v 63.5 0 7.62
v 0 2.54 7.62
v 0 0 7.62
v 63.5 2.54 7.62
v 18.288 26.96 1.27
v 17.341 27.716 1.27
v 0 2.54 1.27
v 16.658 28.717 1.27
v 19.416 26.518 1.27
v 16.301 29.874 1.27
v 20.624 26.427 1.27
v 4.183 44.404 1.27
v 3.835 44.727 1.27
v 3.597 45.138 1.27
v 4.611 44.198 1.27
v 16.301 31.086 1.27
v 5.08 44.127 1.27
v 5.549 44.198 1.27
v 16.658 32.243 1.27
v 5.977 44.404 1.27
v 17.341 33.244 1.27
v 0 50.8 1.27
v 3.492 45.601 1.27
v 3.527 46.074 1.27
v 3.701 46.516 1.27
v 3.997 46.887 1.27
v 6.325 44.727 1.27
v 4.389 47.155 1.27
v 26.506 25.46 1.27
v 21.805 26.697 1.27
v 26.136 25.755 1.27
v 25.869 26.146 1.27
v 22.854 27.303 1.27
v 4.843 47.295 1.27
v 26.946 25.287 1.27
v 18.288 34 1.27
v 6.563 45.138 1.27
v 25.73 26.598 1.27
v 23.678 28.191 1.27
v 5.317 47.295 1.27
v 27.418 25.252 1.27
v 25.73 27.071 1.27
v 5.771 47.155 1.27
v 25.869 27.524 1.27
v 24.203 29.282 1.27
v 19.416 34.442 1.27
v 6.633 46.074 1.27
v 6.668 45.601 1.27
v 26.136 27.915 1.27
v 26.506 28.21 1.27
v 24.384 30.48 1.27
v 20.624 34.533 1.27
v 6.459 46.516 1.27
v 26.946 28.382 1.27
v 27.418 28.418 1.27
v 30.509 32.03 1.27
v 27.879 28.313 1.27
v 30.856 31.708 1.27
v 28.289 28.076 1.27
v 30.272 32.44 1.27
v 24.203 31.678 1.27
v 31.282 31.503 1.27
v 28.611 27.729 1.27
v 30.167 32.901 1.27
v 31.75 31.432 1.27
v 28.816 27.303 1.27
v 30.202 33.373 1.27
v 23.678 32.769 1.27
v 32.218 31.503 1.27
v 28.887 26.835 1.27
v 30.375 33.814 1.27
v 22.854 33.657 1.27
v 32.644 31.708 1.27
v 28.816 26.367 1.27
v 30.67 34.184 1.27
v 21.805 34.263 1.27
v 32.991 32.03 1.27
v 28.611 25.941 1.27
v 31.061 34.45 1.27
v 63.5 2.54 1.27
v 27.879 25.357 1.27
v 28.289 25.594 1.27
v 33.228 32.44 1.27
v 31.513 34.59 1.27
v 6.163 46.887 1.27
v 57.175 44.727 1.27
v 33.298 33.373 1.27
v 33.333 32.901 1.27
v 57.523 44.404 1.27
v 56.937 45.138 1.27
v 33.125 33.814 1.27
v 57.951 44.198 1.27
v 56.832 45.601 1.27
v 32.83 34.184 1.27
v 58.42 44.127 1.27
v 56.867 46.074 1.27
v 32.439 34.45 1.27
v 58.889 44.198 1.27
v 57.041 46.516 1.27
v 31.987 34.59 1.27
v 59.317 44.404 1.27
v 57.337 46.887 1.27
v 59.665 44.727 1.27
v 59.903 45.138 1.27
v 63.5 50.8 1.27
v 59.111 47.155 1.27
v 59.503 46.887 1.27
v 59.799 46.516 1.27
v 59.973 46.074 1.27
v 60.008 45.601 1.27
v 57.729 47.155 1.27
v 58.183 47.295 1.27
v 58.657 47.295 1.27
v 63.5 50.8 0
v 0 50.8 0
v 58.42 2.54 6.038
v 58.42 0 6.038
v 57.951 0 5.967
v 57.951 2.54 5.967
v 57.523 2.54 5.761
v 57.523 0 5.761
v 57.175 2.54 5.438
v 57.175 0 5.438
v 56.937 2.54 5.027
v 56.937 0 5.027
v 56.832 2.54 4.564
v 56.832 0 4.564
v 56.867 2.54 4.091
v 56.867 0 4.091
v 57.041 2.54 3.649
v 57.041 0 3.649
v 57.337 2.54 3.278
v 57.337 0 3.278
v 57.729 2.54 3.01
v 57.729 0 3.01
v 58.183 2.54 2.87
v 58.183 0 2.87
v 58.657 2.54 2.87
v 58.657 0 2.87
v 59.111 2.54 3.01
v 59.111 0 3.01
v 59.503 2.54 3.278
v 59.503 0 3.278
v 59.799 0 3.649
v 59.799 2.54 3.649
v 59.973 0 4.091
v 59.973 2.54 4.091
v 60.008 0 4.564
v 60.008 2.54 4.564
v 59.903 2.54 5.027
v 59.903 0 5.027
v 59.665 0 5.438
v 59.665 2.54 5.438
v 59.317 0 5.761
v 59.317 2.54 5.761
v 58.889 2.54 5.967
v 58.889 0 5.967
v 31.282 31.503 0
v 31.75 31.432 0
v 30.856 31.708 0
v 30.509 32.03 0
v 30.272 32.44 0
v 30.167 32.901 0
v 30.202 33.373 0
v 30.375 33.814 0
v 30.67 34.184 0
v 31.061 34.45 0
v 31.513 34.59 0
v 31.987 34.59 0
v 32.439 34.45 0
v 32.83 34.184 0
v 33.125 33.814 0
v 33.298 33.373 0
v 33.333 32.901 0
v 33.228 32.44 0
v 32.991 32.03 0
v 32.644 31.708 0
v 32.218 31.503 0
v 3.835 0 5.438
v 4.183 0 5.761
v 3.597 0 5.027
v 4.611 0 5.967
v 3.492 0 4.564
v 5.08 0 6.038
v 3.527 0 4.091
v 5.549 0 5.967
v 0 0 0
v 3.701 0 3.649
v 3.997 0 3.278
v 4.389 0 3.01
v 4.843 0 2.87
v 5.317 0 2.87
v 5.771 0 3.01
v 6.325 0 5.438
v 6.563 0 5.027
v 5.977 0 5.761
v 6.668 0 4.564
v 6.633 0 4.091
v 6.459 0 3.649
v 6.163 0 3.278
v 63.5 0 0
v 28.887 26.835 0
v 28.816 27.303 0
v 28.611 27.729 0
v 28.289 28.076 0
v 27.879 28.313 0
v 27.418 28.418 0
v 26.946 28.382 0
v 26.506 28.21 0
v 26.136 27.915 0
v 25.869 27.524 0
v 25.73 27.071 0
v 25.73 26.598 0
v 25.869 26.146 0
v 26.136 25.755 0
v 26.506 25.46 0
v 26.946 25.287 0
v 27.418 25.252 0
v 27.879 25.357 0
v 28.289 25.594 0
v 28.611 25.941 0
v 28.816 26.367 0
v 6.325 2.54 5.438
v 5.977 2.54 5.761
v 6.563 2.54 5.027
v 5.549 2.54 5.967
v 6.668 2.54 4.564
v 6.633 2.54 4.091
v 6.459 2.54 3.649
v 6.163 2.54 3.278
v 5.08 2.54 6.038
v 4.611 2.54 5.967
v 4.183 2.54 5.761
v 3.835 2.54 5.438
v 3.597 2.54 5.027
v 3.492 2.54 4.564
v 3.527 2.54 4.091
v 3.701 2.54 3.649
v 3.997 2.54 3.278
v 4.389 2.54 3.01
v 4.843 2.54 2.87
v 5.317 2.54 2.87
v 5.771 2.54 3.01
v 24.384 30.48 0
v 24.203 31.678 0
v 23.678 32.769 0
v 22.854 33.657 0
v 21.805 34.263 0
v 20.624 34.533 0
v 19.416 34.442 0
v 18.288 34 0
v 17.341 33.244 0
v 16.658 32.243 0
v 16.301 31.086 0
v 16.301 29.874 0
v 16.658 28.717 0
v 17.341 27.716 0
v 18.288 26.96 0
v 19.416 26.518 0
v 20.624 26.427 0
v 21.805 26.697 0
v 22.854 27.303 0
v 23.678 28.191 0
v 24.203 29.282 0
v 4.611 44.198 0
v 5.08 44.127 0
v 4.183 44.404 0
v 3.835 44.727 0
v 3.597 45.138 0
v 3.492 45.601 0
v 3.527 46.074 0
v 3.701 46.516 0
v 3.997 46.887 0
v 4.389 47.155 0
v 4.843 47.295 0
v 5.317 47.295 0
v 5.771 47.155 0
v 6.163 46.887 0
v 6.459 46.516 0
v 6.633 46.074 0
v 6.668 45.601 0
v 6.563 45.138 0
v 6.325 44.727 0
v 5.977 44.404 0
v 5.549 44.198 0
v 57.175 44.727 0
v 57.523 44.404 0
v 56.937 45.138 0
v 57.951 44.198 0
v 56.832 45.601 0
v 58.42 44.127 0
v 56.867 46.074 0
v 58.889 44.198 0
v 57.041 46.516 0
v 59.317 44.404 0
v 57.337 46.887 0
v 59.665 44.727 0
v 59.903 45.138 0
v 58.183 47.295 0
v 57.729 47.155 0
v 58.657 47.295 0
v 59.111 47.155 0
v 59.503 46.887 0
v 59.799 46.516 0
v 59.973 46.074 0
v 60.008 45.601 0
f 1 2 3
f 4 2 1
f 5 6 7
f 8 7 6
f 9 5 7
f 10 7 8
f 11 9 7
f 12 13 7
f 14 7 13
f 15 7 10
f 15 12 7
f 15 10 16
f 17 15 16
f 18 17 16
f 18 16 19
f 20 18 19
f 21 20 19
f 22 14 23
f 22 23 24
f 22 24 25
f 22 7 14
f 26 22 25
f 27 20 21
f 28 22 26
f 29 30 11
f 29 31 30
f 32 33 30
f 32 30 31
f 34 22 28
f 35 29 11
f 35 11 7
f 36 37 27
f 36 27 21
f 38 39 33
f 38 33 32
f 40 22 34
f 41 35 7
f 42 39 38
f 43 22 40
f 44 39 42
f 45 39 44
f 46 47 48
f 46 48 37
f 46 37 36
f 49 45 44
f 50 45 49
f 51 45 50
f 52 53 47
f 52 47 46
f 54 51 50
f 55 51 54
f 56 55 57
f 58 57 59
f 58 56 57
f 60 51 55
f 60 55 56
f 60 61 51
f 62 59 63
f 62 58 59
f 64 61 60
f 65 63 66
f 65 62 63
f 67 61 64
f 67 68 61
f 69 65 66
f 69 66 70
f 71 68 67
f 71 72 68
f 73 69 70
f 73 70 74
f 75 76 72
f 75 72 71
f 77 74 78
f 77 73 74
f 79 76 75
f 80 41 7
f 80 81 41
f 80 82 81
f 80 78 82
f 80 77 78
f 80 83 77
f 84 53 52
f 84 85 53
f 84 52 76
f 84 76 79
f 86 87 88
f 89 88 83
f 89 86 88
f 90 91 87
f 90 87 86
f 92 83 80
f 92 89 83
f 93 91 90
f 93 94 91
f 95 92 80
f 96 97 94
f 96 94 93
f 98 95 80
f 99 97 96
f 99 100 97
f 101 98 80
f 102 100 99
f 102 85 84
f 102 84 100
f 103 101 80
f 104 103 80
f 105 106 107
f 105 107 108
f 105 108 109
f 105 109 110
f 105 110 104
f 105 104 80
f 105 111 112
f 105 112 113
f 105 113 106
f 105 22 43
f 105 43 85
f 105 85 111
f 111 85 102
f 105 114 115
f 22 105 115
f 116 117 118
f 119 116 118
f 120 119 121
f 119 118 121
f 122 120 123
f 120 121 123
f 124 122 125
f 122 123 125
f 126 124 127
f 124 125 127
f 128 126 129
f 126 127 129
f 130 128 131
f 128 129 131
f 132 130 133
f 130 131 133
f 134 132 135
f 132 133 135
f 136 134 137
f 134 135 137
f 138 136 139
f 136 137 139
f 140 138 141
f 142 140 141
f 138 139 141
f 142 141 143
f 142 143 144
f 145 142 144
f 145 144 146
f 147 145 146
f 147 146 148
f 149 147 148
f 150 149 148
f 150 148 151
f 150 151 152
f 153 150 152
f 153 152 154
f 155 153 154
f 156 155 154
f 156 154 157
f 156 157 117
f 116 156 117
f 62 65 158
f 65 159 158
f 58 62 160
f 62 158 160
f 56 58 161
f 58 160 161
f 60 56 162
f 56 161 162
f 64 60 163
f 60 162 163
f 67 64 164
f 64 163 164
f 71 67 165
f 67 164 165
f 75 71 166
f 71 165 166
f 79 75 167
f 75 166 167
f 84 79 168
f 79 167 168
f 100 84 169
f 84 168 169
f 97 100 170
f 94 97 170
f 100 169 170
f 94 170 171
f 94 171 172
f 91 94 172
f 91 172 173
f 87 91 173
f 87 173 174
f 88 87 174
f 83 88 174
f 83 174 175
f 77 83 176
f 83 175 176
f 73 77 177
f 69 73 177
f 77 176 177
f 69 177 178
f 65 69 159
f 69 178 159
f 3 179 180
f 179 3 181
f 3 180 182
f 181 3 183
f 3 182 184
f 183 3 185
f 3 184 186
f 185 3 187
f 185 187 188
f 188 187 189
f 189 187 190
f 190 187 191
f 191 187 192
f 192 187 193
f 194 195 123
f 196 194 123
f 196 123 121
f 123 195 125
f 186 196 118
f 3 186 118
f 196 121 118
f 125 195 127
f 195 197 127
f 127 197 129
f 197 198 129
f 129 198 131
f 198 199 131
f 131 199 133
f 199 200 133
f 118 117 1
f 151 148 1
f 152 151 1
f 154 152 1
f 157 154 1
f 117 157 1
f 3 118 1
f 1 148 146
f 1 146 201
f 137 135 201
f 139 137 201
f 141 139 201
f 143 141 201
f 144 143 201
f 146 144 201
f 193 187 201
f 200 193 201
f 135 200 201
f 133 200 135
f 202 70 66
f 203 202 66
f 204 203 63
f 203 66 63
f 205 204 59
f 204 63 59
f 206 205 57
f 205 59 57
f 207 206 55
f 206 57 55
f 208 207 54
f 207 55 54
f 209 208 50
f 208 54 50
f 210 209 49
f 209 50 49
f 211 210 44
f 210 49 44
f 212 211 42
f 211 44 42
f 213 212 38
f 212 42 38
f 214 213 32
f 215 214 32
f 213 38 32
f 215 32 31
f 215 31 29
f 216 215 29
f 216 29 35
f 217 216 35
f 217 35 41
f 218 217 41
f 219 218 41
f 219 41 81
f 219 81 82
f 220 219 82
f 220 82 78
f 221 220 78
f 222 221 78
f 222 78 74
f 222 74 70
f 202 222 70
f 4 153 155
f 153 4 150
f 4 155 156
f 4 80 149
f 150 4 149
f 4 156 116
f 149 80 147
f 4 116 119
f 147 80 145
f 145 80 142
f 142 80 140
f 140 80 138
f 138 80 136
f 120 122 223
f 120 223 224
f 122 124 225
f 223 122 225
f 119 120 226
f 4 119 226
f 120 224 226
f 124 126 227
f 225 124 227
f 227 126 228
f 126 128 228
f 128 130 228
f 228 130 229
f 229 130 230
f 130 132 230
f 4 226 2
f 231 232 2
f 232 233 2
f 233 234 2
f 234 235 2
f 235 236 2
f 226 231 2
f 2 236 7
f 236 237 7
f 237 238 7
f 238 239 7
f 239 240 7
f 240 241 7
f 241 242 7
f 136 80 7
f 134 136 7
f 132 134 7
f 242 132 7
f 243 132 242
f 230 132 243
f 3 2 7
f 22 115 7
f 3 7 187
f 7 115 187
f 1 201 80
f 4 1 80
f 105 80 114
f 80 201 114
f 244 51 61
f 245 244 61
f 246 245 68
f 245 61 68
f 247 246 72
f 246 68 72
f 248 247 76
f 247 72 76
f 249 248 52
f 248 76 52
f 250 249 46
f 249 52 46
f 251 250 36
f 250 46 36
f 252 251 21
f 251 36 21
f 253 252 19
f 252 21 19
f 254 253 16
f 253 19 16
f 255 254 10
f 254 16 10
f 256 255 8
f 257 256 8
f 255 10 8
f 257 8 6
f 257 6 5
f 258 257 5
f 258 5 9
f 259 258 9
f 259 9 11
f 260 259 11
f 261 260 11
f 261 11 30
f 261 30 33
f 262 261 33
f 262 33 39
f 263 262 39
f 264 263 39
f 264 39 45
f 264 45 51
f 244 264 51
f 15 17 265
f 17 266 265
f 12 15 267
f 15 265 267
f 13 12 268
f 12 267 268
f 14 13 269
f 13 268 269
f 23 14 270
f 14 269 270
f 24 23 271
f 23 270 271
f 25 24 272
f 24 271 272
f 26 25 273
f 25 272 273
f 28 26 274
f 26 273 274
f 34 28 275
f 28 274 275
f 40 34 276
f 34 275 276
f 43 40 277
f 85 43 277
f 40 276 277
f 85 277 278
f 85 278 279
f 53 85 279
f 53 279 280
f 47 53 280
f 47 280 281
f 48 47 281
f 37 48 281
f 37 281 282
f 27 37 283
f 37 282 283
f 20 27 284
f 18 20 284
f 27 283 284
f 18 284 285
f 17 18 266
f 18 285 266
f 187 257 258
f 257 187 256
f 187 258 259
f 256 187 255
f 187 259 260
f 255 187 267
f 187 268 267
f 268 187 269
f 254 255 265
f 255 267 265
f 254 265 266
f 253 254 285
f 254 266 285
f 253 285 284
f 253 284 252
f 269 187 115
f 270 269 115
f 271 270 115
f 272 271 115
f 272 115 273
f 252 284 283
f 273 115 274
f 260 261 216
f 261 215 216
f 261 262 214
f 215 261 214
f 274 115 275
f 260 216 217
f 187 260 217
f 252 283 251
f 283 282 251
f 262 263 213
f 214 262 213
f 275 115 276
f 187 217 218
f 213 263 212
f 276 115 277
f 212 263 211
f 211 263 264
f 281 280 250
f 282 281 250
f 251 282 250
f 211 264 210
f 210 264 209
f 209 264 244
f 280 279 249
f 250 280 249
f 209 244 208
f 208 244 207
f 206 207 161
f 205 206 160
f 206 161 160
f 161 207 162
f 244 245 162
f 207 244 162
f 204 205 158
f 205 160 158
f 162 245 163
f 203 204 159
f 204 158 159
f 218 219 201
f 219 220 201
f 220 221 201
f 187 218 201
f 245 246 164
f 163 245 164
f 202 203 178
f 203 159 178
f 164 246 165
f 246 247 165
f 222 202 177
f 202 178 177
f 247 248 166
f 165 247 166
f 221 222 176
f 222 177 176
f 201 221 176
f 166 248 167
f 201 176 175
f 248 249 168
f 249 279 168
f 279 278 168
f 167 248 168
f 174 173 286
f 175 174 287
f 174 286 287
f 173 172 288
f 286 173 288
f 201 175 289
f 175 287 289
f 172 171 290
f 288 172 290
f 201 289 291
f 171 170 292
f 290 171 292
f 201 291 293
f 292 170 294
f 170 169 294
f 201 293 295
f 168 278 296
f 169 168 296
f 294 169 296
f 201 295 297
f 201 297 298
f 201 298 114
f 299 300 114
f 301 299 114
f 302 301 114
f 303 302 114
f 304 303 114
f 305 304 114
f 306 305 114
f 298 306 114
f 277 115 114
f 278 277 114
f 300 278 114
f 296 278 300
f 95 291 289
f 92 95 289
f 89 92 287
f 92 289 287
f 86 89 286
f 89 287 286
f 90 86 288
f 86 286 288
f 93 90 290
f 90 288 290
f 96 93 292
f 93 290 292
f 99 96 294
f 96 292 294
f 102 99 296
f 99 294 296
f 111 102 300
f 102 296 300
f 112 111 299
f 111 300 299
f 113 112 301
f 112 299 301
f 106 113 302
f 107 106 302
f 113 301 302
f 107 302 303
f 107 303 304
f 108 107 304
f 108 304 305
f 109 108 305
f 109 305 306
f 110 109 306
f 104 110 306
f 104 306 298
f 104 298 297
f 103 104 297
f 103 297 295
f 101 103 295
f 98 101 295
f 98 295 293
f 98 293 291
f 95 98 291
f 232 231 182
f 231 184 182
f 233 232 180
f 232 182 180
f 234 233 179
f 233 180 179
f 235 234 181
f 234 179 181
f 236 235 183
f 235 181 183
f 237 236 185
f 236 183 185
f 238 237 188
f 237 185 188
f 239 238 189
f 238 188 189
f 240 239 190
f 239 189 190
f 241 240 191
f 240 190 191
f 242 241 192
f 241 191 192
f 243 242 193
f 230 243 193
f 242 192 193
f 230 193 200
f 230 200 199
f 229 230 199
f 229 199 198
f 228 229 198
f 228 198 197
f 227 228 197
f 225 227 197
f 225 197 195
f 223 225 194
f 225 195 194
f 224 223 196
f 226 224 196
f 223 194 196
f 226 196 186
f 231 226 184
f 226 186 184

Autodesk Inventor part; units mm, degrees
ref_plane "YZ Plane" through (0, 0, 0) normal (1, 0, 0) x (0, 1, 0)
ref_plane "XZ Plane" through (0, 0, 0) normal (0, 1, 0) x (-1, 0, 0)
ref_plane "XY Plane" through (0, 0, 0) normal (0, 0, 1) x (1, 0, 0)
sketch "Sketch1" plane through (0, 0, 0) normal (0, 0, 1) x (1, 0, 0)
  line L0 (0, 0) -> (63.5, 0)
  line L1 (63.5, 0) -> (63.5, 50.8)
  line L2 (63.5, 50.8) -> (0, 50.8)
  line L3 (0, 50.8) -> (0, 0)
  dimension "d0" = 50.8
  dimension "d1" = 63.5
extrude "Extrusion1" add sketch "Sketch1" along normal blind 1.27
sketch "Sketch2" plane through (0, 0, 1.27) normal (0, 0, 1) x (1, 0, 0)
  line L0 (63.5, 0) -> (63.5, 50.8) projected
  line L1 (0, 0) -> (63.5, 0)
  line L2 (63.5, 0) -> (63.5, 2.54)
  line L3 (63.5, 2.54) -> (0, 2.54)
  line L4 (0, 2.54) -> (0, 0)
  dimension "d4" = 2.54
extrude "Extrusion2" add sketch "Sketch2" along normal blind 6.35
sketch "Sketch3" plane through (0, 0, 1.27) normal (0, 0, 1) x (1, 0, 0)
  line L0 (63.5, 50.8) -> (0, 50.8) projected
  line L1 (63.5, 2.54) -> (63.5, 50.8) projected
  point P0 (0, 0)
  point P1 (31.75, 33.02)
  dimension "d7" = 17.78
  dimension "d8" = 31.75
hole "Hole1" at (31.75, 33.02, 1.27) direction (0, 0, -1) diameter 3.175 depth 25.4 tip angle 118
sketch "Sketch4" plane through (0, 0, 1.27) normal (0, 0, 1) x (1, 0, 0)
  line L0 (0, 50.8) -> (0, 2.54) projected
  line L1 (63.5, 2.54) -> (63.5, 50.8) projected
  line L2 (63.5, 50.8) -> (0, 50.8) projected
  point P0 (0, 0)
  point P1 (5.08, 45.72)
  point P2 (58.42, 45.72)
  dimension "d16" = 5.08
  dimension "d17" = 5.08
  dimension "d18" = 5.08
  dimension "d19" = 5.08
hole "Hole2" at (5.08, 45.72, 1.27) at (58.42, 45.72, 1.27) direction (0, 0, -1) diameter 3.1852 depth 25.4 tip angle 118
sketch "Sketch5" plane through (0, 2.54, 1.27) normal (0, 1, 0) x (1, 0, 0)
  line L0 (63.5, -6.35) -> (0, -6.35) projected
  line L1 (0, 0) -> (0, -6.35) projected
  line L2 (63.5, 0) -> (63.5, -6.35) projected
  point P0 (0, 1.27)
  point P1 (5.08, -3.175)
  point P2 (58.42, -3.175)
  dimension "d27" = 3.175
  dimension "d28" = 5.08
  dimension "d29" = 3.175
  dimension "d30" = 5.08
hole "Hole3" at (5.08, 2.54, 4.445) at (58.42, 2.54, 4.445) direction (0, -1, 0) diameter 3.1852 depth 25.4 tip angle 118
sketch "Sketch6" plane through (0, 0, 1.27) normal (0, 0, 1) x (1, 0, 0)
  circle A0 centre (31.75, 33.02) radius 1.5875 construction
  circle A1 centre (31.75, 33.02) radius 3.81 construction
  circle A2 centre (27.2994, 26.8348) radius 3.81 construction
  line L0 (0, 0) -> (63.5, 0) projected
  circle A3 centre (20.32, 30.48) radius 4.064
  circle A4 centre (27.2994, 26.8348) radius 1.5875
  circle A5 centre (5.08, 45.72) radius 1.5926 projected
  line L1 (0, 50.8) -> (0, 2.54) projected
  dimension "d38" = 7.62
  dimension "d39" = 7.62
  dimension "d42" = 8.128
  dimension "d43" = 3.175
  dimension "d46" = 15.24
  dimension "d47" = 15.24
  dimension "d48" = 26.8348
  dimension "d49" = 27.2994
extrude "Extrusion3" cut sketch "Sketch6" against normal blind 25.4 contours A3 | A4
properties part number "000110-2"
